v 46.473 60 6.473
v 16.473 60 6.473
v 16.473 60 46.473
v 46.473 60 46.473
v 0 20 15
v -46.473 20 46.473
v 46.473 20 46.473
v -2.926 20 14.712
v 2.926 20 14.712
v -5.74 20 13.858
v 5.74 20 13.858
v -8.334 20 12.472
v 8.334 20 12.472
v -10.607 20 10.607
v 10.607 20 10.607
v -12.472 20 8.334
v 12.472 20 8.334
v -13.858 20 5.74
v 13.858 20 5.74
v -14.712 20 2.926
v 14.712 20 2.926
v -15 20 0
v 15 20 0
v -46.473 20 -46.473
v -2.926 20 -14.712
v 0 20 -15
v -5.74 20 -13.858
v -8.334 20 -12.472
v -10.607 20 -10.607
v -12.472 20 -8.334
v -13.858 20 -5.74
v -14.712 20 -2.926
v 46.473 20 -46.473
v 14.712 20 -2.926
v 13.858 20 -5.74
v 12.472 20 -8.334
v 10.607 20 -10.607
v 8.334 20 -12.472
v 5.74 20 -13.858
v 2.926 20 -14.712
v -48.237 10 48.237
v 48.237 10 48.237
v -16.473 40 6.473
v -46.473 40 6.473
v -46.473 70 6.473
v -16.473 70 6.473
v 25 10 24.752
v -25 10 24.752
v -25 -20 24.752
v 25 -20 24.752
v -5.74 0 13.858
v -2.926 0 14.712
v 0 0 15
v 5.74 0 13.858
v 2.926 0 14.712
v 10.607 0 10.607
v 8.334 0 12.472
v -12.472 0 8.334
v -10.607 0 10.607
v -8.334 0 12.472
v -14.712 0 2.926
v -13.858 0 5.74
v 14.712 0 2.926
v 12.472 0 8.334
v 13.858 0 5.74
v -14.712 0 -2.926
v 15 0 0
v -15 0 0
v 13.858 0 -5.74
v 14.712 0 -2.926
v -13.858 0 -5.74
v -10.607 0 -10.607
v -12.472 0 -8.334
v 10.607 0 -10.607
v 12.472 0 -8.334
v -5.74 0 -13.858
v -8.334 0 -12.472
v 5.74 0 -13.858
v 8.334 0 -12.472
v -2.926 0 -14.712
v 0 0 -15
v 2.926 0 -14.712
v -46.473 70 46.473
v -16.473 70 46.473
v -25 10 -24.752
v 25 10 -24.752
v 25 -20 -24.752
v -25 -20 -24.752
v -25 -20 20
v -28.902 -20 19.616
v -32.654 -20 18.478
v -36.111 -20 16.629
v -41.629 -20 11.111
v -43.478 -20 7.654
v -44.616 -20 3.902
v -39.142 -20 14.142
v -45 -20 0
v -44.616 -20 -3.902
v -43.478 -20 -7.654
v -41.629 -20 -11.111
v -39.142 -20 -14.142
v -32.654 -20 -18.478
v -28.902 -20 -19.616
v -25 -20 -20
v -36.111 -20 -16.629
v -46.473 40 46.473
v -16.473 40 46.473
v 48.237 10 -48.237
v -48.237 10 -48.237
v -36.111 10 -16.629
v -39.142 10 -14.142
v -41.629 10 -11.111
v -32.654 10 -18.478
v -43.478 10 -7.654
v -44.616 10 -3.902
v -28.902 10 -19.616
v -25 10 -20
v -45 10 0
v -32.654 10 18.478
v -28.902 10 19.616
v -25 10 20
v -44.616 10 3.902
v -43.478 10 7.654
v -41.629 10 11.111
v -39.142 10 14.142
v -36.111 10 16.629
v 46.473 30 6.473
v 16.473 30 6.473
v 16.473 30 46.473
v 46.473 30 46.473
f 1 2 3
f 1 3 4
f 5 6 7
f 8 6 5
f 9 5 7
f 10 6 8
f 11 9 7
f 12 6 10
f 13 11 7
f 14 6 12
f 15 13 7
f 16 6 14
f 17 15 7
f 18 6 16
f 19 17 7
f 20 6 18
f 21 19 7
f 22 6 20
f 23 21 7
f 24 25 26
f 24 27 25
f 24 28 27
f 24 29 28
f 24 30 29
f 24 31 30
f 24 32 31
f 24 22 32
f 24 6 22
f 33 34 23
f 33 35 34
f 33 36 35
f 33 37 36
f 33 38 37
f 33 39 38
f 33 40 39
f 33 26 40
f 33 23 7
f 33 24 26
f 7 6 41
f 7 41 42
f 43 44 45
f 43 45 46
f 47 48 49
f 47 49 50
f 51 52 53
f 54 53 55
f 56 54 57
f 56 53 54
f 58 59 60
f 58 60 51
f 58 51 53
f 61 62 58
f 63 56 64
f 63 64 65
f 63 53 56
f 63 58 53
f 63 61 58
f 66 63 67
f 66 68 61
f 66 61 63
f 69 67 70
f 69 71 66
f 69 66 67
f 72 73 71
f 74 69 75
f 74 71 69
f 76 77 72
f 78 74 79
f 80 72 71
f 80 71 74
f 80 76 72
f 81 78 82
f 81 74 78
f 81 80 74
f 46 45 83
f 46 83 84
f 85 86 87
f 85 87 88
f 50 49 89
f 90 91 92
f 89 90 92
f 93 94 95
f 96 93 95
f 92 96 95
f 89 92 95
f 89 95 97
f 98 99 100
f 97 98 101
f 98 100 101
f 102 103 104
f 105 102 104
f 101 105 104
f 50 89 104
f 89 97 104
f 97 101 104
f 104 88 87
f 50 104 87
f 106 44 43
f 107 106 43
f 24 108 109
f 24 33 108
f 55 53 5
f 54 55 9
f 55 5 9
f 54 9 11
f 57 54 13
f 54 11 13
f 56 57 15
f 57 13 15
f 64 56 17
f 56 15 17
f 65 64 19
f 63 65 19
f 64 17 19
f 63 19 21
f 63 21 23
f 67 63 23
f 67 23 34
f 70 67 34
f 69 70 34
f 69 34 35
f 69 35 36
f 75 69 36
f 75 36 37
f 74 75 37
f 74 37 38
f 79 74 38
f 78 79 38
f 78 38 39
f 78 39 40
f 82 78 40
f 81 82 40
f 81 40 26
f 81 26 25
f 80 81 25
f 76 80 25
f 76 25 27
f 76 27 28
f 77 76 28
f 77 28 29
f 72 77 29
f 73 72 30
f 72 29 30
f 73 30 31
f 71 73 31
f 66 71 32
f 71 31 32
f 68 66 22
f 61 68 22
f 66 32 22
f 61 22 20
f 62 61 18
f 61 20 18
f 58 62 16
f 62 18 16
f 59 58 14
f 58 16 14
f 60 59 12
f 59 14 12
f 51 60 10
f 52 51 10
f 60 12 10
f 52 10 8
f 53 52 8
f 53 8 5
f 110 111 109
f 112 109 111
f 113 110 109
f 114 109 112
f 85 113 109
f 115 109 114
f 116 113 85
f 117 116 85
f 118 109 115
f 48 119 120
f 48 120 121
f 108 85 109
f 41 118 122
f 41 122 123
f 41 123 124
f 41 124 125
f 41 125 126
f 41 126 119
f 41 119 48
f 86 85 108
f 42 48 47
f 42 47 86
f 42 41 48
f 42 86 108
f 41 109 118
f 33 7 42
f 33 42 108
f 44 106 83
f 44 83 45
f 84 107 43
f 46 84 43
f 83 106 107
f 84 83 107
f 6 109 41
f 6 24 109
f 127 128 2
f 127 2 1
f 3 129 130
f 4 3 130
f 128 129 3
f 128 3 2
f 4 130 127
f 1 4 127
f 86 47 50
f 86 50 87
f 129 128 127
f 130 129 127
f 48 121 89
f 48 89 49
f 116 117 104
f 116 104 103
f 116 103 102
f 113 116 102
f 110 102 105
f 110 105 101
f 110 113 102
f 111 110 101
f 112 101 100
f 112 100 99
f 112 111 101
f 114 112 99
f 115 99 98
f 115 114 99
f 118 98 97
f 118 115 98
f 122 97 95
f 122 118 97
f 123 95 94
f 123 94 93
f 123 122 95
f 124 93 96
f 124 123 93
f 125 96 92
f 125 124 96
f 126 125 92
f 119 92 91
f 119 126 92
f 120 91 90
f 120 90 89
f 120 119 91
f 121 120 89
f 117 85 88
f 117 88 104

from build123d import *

# Parameters (mm, degrees)
SKETCH1_W                = 100
SKETCH1_H                = 100
BOSS_EXTRUDE1_DEPTH      = 20
BOSS_EXTRUDE1_TAPER      = 10
BOSS_EXTRUDE2_DEPTH      = 20
BOSS_EXTRUDE2_DEPTH_BACK = 10
BOSS_EXTRUDE2_START      = 30
SKETCH2_W                = 30
SKETCH2_H                = 40
BOSS_EXTRUDE3_START      = 10
SKETCH3_W                = 30
SKETCH3_H                = 40
BOSS_EXTRUDE3_DEPTH      = 30
SKETCH5_R                = 15
CUT_EXTRUDE1_DEPTH       = 30
SKETCH7_OUTSIDE_W        = 135.526
SKETCH7_OUTSIDE_H        = 135.526
CUT_EXTRUDE2_DEPTH       = 30


with BuildPart() as part:
    # Sketch1 → Boss-Extrude1 (new body)
    with BuildSketch(Plane(origin=(0, 0, 0), x_dir=(1, 0, 0), z_dir=(0, 1, 0))):
        Rectangle(SKETCH1_W, SKETCH1_H)
    boss_extrude1 = extrude(amount=BOSS_EXTRUDE1_DEPTH, taper=BOSS_EXTRUDE1_TAPER)

    # Sketch5 → Cut-Extrude1 (cut)
    with BuildSketch(Plane(origin=(0, 20, 0), x_dir=(1, 0, 0), z_dir=(0, 1, 0))):
        Circle(SKETCH5_R)
    extrude(amount=-CUT_EXTRUDE1_DEPTH, mode=Mode.SUBTRACT)

    # Mirror3: Boss-Extrude1 across plane
    add(boss_extrude1.mirror(Plane.ZX))

    # Sketch7 outside → Cut-Extrude2 (cut)
    with BuildSketch(Plane.XZ.offset(20)):
        Rectangle(SKETCH7_OUTSIDE_W, SKETCH7_OUTSIDE_H)
        with BuildLine():
            Line((25, 24.751616122), (-25, 24.751616122))
            Line((-25, 24.751616122), (-25, 20))
            ThreePointArc((-25, 20), (-45, 0), (-25, -20))
            Line((-25, -20), (-25, -24.751616122))
            Line((-25, -24.751616122), (25, -24.751616122))
            Line((25, -24.751616122), (25, 24.751616122))
        make_face(mode=Mode.SUBTRACT)
    extrude(amount=-CUT_EXTRUDE2_DEPTH, mode=Mode.SUBTRACT)


with BuildPart() as body_2:
    # Sketch2 → Boss-Extrude2 (new, two sides: drawn at the far end of the back side and taken through both)
    with BuildSketch(Plane(origin=(0, 20, 0), x_dir=(1, 0, 0), z_dir=(0, 1, 0)).offset(BOSS_EXTRUDE2_START - BOSS_EXTRUDE2_DEPTH_BACK)):
        with Locations((-31.473460386, -26.473460386)):
            Rectangle(SKETCH2_W, SKETCH2_H)
    extrude(amount=BOSS_EXTRUDE2_DEPTH + BOSS_EXTRUDE2_DEPTH_BACK)


with BuildPart() as body_3:
    # Sketch3 → Boss-Extrude3 (new body)
    with BuildSketch(Plane(origin=(0, 20, 0), x_dir=(1, 0, 0), z_dir=(0, 1, 0)).offset(BOSS_EXTRUDE3_START)):
        with Locations((31.473460386, -26.473460386)):
            Rectangle(SKETCH3_W, SKETCH3_H)
    extrude(amount=BOSS_EXTRUDE3_DEPTH)


solid = Compound([part.part, body_2.part, body_3.part])
